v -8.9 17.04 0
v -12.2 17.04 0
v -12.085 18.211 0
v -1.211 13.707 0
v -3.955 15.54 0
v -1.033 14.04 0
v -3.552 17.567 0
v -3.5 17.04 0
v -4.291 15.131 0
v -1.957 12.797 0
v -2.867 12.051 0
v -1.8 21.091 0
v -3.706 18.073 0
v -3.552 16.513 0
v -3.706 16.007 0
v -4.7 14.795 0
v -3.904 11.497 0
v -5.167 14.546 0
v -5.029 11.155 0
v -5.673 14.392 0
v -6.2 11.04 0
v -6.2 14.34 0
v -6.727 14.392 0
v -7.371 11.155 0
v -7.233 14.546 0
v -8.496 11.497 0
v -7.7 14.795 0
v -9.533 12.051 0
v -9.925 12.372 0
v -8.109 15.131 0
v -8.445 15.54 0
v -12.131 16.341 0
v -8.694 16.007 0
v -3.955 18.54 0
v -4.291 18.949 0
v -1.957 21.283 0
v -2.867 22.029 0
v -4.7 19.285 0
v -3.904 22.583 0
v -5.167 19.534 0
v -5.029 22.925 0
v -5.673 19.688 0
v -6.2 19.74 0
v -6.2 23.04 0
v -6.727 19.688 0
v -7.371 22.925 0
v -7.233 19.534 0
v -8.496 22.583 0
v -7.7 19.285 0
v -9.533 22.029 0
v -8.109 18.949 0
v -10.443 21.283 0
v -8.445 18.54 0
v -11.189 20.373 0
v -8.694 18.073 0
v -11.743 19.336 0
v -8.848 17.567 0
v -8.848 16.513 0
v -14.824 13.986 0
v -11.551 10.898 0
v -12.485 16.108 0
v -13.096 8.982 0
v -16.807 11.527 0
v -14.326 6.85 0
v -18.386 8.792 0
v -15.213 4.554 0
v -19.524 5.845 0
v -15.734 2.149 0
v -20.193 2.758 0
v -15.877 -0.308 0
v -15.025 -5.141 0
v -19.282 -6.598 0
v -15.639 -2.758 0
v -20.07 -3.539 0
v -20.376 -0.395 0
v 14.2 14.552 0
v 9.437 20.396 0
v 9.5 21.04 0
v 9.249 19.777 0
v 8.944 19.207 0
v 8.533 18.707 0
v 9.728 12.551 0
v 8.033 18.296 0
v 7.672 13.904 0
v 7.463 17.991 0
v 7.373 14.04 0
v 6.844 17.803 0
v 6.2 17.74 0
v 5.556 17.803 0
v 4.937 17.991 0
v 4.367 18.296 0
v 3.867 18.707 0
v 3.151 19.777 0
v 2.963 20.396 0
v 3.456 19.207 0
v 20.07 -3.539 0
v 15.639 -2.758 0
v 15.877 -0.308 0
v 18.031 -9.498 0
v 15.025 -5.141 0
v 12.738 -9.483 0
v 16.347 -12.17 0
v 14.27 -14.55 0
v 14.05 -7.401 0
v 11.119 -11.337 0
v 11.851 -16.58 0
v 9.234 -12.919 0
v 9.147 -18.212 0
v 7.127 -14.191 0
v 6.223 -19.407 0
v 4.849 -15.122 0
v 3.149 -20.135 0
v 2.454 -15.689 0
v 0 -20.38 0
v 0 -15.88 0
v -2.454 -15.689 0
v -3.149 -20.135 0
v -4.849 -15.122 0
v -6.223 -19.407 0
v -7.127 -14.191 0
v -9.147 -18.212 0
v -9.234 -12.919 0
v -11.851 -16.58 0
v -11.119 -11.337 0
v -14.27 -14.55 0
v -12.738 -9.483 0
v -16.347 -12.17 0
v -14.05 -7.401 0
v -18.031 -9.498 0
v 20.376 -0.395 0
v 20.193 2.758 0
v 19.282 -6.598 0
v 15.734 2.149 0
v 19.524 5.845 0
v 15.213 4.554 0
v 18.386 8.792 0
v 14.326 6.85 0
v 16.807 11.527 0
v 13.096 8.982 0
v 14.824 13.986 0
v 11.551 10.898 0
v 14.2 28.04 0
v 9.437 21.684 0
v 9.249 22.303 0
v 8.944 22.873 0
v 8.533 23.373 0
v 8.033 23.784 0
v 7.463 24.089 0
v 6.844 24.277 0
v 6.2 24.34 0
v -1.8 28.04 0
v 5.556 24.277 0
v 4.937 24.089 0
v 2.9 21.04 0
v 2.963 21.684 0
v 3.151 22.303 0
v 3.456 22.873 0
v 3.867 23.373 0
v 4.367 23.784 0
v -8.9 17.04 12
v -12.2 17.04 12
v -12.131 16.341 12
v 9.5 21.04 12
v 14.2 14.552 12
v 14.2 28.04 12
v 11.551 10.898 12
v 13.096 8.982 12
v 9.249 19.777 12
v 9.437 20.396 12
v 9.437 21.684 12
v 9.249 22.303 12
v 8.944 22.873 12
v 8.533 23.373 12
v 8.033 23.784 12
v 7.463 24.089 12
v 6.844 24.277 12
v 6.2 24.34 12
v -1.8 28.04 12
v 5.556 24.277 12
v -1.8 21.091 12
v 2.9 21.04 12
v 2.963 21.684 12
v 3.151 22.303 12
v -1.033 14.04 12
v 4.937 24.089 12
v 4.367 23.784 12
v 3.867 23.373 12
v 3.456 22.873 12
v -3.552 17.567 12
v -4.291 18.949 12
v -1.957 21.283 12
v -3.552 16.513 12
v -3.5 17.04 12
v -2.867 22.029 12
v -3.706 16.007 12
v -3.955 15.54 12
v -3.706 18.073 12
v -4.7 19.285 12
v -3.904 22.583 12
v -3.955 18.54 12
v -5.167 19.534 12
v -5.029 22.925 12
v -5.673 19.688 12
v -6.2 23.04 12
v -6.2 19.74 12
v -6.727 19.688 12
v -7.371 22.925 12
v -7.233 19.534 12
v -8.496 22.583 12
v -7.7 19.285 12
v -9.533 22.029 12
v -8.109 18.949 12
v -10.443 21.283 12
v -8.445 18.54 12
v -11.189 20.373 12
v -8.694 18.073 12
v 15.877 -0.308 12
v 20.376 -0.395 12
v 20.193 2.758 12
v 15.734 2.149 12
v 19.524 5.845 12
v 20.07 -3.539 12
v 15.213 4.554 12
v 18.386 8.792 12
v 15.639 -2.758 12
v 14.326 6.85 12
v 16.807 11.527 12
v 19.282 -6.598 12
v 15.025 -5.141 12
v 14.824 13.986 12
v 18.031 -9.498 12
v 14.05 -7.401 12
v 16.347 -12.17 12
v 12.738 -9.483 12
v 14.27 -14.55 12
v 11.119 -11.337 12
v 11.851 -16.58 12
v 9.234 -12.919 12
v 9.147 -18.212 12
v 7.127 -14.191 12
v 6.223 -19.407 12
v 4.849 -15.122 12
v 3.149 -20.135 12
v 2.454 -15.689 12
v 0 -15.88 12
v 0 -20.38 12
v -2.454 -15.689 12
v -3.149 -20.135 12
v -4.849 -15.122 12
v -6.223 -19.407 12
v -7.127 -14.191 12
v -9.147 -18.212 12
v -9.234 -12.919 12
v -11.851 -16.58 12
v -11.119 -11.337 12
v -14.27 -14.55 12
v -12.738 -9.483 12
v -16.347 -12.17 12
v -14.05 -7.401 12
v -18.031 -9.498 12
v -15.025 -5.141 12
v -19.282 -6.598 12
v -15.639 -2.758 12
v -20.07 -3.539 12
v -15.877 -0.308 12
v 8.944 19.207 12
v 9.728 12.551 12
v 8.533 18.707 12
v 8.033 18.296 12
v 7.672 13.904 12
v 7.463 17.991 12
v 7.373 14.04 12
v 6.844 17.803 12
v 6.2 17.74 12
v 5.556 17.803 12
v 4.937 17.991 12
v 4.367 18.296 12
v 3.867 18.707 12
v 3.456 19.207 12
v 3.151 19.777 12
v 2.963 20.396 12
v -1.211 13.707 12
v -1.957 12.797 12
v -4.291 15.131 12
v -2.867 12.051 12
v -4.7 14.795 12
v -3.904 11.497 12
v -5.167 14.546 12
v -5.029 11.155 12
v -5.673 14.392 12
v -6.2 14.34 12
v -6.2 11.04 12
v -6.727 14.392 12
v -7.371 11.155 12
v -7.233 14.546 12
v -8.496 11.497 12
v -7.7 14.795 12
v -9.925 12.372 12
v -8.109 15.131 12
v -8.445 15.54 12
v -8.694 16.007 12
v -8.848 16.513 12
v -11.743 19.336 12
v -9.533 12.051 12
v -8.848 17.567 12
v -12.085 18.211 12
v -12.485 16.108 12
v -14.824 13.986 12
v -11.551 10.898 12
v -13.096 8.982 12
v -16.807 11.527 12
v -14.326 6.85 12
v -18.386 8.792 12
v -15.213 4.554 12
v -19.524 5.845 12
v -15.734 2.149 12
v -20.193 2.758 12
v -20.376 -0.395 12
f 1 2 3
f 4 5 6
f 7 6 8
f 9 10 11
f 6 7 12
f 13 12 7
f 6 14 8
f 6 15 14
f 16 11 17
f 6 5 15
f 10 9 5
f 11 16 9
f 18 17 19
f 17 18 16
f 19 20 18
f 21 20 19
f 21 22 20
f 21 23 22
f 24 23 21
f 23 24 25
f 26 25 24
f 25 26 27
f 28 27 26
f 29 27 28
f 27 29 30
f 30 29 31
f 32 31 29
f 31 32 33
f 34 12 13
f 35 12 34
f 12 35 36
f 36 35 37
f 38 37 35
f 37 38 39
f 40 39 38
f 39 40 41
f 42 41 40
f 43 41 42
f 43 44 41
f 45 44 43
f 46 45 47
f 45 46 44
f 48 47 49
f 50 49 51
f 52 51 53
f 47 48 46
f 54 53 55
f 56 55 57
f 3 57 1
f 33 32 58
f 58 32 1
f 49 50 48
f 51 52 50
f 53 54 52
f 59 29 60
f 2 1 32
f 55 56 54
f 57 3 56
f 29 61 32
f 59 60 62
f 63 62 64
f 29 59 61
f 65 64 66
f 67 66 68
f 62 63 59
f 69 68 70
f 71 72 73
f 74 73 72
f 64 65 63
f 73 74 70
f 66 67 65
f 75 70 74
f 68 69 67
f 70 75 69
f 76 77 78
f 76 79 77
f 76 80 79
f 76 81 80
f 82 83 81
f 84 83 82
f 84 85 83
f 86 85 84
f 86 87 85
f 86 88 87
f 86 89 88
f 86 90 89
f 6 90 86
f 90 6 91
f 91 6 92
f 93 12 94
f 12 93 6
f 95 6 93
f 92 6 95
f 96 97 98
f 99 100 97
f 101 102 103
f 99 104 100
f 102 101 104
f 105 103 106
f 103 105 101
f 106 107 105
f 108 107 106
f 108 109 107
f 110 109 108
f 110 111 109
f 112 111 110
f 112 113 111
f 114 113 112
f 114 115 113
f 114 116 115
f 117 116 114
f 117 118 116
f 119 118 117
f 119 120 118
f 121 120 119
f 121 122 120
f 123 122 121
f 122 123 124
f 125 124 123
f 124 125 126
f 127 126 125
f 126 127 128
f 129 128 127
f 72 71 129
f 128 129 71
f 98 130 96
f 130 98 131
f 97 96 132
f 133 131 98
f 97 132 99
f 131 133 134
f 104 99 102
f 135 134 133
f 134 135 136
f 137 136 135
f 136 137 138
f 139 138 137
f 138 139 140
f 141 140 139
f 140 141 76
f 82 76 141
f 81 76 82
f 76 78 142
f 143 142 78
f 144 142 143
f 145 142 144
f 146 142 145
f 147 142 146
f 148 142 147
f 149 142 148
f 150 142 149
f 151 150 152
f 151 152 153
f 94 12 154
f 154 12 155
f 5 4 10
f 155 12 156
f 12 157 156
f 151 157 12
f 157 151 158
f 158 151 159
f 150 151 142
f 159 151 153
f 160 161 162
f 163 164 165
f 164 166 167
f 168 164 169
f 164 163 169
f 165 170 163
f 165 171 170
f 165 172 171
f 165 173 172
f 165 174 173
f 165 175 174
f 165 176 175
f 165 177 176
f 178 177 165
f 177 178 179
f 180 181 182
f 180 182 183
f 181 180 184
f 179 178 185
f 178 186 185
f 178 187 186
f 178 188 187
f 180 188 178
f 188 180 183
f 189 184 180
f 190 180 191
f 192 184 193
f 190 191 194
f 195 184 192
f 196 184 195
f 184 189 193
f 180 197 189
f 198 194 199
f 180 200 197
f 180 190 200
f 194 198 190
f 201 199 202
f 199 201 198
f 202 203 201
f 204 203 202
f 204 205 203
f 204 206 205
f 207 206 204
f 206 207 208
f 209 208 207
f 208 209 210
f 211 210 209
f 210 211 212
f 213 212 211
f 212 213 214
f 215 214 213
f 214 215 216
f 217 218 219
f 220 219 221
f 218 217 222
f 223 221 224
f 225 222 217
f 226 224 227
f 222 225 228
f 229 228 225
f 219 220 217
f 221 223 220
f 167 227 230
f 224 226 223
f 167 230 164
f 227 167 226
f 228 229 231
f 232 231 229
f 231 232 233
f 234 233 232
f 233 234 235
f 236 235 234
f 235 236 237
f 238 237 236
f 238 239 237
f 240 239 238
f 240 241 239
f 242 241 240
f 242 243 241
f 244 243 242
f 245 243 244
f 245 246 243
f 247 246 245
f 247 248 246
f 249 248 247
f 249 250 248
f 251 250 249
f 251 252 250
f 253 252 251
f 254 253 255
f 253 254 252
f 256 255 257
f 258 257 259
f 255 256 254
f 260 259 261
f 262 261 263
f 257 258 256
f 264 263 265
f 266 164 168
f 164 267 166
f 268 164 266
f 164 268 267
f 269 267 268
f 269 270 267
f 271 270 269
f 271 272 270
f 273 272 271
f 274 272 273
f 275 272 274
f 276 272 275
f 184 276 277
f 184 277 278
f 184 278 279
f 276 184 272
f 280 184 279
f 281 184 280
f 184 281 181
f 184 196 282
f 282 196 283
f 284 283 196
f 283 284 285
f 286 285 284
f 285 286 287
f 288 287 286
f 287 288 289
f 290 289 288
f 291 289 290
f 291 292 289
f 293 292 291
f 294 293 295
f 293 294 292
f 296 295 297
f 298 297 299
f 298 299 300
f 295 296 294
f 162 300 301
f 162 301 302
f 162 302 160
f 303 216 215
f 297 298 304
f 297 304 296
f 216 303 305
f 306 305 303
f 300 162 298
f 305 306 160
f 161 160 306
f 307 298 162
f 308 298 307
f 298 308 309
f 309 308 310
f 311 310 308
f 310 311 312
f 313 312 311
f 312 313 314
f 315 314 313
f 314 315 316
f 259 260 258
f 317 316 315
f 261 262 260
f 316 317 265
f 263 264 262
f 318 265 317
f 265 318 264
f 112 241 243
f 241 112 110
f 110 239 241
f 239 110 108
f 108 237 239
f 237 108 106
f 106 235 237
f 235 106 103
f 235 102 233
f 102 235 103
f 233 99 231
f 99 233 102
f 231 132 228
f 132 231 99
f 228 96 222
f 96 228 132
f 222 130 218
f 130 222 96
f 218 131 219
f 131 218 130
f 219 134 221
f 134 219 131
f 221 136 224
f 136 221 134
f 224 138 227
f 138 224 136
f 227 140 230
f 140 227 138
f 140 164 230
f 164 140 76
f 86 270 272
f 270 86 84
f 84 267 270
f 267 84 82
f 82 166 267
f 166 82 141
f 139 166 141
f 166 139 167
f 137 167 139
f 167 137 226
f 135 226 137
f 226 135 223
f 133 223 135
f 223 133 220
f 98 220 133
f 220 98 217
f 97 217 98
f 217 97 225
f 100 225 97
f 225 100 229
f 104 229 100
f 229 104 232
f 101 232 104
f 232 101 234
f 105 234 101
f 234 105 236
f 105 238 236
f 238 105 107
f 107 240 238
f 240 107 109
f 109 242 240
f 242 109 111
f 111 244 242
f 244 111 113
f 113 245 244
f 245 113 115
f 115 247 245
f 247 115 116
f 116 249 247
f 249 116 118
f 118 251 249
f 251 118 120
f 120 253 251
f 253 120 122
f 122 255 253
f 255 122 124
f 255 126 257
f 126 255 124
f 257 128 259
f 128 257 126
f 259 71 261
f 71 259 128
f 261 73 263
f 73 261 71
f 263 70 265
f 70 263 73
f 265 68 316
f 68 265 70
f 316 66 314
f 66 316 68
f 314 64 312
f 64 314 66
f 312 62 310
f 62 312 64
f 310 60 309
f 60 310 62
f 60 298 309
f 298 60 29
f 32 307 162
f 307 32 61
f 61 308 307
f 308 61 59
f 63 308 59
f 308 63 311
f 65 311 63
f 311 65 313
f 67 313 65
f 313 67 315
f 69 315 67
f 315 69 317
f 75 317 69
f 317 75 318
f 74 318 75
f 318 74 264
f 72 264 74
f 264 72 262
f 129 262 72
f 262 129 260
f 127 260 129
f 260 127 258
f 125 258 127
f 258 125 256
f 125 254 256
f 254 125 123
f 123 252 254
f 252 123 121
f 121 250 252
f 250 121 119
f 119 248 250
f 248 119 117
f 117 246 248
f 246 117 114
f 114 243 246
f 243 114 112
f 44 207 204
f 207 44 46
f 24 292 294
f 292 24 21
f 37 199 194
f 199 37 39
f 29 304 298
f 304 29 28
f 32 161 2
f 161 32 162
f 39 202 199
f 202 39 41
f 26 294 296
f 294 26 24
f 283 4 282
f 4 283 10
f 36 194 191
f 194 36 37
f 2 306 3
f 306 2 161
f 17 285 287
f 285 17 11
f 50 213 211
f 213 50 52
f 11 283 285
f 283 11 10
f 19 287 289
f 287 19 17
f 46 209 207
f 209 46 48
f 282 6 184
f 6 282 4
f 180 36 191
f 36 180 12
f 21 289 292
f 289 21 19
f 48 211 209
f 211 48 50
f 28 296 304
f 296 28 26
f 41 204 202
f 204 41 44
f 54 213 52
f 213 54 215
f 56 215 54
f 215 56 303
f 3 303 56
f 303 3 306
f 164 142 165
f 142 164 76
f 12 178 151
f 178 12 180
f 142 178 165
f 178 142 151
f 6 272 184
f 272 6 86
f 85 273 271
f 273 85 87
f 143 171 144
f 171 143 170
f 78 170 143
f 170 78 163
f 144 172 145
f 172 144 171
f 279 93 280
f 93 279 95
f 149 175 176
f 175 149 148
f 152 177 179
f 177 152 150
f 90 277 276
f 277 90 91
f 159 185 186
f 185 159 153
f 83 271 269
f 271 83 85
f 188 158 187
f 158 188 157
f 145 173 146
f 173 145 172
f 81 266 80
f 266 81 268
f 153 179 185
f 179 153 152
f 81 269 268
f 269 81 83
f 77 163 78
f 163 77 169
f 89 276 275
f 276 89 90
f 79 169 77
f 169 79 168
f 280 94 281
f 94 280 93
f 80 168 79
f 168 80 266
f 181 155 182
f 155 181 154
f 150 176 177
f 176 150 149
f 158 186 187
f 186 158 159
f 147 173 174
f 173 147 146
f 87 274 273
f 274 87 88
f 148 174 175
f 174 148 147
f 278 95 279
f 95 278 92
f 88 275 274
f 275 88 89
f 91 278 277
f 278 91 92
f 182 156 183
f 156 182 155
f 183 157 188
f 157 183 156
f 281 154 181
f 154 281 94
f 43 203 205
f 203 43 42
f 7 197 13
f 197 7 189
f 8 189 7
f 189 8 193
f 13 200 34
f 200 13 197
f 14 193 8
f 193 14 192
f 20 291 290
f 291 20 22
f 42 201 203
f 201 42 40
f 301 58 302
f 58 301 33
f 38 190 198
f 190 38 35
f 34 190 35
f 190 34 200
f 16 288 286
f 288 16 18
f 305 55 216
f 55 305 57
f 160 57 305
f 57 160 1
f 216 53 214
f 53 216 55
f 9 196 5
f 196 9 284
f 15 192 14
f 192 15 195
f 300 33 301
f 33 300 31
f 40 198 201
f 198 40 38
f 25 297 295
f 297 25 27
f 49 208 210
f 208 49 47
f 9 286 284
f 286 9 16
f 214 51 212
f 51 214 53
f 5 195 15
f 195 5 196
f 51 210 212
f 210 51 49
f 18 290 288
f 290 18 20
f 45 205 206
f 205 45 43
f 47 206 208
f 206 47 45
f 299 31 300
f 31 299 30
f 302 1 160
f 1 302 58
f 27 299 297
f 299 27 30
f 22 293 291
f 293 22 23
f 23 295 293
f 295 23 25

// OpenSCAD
$fn = 32;

// ----------------------------------------------------------------------
// Pipe clamp: 40.76 mm ring, 4.5 mm wall, 12 mm wide
// ----------------------------------------------------------------------

// --- parameters (mm) ---
outer_r = 20.38;          // clamp outside radius
inner_r = 15.88;          // pipe bore radius
band = 4.5;               // band thickness
clamp_w = 12;             // clamp width
opening = 40;             // opening angle between the ends
lug_w = 16;               // lug width
lug_len = 14;             // lug length
bolt_d = 6.6;             // bolt hole
knuckle_d = 12;           // hinge knuckle diameter
pin_d = 5.4;              // hinge pin hole

clamp_profile = [[-6.97, 19.151], [-9.846, 17.844], [-12.485, 16.108], [-14.824, 13.986], [-16.807, 11.527], [-18.386, 8.792], [-19.524, 5.845], [-20.193, 2.758], [-20.376, -0.395], [-20.07, -3.539], [-19.282, -6.598], [-18.031, -9.498], [-16.347, -12.17], [-14.27, -14.55], [-11.851, -16.58], [-9.147, -18.212], [-6.223, -19.407], [-3.149, -20.135], [0, -20.38], [3.149, -20.135], [6.223, -19.407], [9.147, -18.212], [11.851, -16.58], [14.27, -14.55], [16.347, -12.17], [18.031, -9.498], [19.282, -6.598], [20.07, -3.539], [20.376, -0.395], [20.193, 2.758], [19.524, 5.845], [18.386, 8.792], [16.807, 11.527], [14.824, 13.986], [12.485, 16.108], [9.846, 17.844], [6.97, 19.151], [5.431, 14.922], [7.672, 13.904], [9.728, 12.551], [11.551, 10.898], [13.096, 8.982], [14.326, 6.85], [15.213, 4.554], [15.734, 2.149], [15.877, -0.308], [15.639, -2.758], [15.025, -5.141], [14.05, -7.401], [12.738, -9.483], [11.119, -11.337], [9.234, -12.919], [7.127, -14.191], [4.849, -15.122], [2.454, -15.689], [0, -15.88], [-2.454, -15.689], [-4.849, -15.122], [-7.127, -14.191], [-9.234, -12.919], [-11.119, -11.337], [-12.738, -9.483], [-14.05, -7.401], [-15.025, -5.141], [-15.639, -2.758], [-15.877, -0.308], [-15.734, 2.149], [-15.213, 4.554], [-14.326, 6.85], [-13.096, 8.982], [-11.551, 10.898], [-9.728, 12.551], [-7.672, 13.904], [-5.431, 14.922]];

difference() {
  union() {
    linear_extrude(height = clamp_w) polygon(clamp_profile);
    /* hinge knuckle, sunk 2 mm into the band end */
    translate([-6.2, 17.04, 0]) cylinder(h = clamp_w, d = knuckle_d);
    /* bolt lug on the other end */
    translate([-1.8, 14.04, 0]) cube([lug_w, 14, clamp_w]);
  }
  translate([6.2, 21.04, -2.5]) cylinder(h = clamp_w + 5, d = bolt_d);
  translate([-6.2, 17.04, -2.5]) cylinder(h = clamp_w + 5, d = pin_d);
}
